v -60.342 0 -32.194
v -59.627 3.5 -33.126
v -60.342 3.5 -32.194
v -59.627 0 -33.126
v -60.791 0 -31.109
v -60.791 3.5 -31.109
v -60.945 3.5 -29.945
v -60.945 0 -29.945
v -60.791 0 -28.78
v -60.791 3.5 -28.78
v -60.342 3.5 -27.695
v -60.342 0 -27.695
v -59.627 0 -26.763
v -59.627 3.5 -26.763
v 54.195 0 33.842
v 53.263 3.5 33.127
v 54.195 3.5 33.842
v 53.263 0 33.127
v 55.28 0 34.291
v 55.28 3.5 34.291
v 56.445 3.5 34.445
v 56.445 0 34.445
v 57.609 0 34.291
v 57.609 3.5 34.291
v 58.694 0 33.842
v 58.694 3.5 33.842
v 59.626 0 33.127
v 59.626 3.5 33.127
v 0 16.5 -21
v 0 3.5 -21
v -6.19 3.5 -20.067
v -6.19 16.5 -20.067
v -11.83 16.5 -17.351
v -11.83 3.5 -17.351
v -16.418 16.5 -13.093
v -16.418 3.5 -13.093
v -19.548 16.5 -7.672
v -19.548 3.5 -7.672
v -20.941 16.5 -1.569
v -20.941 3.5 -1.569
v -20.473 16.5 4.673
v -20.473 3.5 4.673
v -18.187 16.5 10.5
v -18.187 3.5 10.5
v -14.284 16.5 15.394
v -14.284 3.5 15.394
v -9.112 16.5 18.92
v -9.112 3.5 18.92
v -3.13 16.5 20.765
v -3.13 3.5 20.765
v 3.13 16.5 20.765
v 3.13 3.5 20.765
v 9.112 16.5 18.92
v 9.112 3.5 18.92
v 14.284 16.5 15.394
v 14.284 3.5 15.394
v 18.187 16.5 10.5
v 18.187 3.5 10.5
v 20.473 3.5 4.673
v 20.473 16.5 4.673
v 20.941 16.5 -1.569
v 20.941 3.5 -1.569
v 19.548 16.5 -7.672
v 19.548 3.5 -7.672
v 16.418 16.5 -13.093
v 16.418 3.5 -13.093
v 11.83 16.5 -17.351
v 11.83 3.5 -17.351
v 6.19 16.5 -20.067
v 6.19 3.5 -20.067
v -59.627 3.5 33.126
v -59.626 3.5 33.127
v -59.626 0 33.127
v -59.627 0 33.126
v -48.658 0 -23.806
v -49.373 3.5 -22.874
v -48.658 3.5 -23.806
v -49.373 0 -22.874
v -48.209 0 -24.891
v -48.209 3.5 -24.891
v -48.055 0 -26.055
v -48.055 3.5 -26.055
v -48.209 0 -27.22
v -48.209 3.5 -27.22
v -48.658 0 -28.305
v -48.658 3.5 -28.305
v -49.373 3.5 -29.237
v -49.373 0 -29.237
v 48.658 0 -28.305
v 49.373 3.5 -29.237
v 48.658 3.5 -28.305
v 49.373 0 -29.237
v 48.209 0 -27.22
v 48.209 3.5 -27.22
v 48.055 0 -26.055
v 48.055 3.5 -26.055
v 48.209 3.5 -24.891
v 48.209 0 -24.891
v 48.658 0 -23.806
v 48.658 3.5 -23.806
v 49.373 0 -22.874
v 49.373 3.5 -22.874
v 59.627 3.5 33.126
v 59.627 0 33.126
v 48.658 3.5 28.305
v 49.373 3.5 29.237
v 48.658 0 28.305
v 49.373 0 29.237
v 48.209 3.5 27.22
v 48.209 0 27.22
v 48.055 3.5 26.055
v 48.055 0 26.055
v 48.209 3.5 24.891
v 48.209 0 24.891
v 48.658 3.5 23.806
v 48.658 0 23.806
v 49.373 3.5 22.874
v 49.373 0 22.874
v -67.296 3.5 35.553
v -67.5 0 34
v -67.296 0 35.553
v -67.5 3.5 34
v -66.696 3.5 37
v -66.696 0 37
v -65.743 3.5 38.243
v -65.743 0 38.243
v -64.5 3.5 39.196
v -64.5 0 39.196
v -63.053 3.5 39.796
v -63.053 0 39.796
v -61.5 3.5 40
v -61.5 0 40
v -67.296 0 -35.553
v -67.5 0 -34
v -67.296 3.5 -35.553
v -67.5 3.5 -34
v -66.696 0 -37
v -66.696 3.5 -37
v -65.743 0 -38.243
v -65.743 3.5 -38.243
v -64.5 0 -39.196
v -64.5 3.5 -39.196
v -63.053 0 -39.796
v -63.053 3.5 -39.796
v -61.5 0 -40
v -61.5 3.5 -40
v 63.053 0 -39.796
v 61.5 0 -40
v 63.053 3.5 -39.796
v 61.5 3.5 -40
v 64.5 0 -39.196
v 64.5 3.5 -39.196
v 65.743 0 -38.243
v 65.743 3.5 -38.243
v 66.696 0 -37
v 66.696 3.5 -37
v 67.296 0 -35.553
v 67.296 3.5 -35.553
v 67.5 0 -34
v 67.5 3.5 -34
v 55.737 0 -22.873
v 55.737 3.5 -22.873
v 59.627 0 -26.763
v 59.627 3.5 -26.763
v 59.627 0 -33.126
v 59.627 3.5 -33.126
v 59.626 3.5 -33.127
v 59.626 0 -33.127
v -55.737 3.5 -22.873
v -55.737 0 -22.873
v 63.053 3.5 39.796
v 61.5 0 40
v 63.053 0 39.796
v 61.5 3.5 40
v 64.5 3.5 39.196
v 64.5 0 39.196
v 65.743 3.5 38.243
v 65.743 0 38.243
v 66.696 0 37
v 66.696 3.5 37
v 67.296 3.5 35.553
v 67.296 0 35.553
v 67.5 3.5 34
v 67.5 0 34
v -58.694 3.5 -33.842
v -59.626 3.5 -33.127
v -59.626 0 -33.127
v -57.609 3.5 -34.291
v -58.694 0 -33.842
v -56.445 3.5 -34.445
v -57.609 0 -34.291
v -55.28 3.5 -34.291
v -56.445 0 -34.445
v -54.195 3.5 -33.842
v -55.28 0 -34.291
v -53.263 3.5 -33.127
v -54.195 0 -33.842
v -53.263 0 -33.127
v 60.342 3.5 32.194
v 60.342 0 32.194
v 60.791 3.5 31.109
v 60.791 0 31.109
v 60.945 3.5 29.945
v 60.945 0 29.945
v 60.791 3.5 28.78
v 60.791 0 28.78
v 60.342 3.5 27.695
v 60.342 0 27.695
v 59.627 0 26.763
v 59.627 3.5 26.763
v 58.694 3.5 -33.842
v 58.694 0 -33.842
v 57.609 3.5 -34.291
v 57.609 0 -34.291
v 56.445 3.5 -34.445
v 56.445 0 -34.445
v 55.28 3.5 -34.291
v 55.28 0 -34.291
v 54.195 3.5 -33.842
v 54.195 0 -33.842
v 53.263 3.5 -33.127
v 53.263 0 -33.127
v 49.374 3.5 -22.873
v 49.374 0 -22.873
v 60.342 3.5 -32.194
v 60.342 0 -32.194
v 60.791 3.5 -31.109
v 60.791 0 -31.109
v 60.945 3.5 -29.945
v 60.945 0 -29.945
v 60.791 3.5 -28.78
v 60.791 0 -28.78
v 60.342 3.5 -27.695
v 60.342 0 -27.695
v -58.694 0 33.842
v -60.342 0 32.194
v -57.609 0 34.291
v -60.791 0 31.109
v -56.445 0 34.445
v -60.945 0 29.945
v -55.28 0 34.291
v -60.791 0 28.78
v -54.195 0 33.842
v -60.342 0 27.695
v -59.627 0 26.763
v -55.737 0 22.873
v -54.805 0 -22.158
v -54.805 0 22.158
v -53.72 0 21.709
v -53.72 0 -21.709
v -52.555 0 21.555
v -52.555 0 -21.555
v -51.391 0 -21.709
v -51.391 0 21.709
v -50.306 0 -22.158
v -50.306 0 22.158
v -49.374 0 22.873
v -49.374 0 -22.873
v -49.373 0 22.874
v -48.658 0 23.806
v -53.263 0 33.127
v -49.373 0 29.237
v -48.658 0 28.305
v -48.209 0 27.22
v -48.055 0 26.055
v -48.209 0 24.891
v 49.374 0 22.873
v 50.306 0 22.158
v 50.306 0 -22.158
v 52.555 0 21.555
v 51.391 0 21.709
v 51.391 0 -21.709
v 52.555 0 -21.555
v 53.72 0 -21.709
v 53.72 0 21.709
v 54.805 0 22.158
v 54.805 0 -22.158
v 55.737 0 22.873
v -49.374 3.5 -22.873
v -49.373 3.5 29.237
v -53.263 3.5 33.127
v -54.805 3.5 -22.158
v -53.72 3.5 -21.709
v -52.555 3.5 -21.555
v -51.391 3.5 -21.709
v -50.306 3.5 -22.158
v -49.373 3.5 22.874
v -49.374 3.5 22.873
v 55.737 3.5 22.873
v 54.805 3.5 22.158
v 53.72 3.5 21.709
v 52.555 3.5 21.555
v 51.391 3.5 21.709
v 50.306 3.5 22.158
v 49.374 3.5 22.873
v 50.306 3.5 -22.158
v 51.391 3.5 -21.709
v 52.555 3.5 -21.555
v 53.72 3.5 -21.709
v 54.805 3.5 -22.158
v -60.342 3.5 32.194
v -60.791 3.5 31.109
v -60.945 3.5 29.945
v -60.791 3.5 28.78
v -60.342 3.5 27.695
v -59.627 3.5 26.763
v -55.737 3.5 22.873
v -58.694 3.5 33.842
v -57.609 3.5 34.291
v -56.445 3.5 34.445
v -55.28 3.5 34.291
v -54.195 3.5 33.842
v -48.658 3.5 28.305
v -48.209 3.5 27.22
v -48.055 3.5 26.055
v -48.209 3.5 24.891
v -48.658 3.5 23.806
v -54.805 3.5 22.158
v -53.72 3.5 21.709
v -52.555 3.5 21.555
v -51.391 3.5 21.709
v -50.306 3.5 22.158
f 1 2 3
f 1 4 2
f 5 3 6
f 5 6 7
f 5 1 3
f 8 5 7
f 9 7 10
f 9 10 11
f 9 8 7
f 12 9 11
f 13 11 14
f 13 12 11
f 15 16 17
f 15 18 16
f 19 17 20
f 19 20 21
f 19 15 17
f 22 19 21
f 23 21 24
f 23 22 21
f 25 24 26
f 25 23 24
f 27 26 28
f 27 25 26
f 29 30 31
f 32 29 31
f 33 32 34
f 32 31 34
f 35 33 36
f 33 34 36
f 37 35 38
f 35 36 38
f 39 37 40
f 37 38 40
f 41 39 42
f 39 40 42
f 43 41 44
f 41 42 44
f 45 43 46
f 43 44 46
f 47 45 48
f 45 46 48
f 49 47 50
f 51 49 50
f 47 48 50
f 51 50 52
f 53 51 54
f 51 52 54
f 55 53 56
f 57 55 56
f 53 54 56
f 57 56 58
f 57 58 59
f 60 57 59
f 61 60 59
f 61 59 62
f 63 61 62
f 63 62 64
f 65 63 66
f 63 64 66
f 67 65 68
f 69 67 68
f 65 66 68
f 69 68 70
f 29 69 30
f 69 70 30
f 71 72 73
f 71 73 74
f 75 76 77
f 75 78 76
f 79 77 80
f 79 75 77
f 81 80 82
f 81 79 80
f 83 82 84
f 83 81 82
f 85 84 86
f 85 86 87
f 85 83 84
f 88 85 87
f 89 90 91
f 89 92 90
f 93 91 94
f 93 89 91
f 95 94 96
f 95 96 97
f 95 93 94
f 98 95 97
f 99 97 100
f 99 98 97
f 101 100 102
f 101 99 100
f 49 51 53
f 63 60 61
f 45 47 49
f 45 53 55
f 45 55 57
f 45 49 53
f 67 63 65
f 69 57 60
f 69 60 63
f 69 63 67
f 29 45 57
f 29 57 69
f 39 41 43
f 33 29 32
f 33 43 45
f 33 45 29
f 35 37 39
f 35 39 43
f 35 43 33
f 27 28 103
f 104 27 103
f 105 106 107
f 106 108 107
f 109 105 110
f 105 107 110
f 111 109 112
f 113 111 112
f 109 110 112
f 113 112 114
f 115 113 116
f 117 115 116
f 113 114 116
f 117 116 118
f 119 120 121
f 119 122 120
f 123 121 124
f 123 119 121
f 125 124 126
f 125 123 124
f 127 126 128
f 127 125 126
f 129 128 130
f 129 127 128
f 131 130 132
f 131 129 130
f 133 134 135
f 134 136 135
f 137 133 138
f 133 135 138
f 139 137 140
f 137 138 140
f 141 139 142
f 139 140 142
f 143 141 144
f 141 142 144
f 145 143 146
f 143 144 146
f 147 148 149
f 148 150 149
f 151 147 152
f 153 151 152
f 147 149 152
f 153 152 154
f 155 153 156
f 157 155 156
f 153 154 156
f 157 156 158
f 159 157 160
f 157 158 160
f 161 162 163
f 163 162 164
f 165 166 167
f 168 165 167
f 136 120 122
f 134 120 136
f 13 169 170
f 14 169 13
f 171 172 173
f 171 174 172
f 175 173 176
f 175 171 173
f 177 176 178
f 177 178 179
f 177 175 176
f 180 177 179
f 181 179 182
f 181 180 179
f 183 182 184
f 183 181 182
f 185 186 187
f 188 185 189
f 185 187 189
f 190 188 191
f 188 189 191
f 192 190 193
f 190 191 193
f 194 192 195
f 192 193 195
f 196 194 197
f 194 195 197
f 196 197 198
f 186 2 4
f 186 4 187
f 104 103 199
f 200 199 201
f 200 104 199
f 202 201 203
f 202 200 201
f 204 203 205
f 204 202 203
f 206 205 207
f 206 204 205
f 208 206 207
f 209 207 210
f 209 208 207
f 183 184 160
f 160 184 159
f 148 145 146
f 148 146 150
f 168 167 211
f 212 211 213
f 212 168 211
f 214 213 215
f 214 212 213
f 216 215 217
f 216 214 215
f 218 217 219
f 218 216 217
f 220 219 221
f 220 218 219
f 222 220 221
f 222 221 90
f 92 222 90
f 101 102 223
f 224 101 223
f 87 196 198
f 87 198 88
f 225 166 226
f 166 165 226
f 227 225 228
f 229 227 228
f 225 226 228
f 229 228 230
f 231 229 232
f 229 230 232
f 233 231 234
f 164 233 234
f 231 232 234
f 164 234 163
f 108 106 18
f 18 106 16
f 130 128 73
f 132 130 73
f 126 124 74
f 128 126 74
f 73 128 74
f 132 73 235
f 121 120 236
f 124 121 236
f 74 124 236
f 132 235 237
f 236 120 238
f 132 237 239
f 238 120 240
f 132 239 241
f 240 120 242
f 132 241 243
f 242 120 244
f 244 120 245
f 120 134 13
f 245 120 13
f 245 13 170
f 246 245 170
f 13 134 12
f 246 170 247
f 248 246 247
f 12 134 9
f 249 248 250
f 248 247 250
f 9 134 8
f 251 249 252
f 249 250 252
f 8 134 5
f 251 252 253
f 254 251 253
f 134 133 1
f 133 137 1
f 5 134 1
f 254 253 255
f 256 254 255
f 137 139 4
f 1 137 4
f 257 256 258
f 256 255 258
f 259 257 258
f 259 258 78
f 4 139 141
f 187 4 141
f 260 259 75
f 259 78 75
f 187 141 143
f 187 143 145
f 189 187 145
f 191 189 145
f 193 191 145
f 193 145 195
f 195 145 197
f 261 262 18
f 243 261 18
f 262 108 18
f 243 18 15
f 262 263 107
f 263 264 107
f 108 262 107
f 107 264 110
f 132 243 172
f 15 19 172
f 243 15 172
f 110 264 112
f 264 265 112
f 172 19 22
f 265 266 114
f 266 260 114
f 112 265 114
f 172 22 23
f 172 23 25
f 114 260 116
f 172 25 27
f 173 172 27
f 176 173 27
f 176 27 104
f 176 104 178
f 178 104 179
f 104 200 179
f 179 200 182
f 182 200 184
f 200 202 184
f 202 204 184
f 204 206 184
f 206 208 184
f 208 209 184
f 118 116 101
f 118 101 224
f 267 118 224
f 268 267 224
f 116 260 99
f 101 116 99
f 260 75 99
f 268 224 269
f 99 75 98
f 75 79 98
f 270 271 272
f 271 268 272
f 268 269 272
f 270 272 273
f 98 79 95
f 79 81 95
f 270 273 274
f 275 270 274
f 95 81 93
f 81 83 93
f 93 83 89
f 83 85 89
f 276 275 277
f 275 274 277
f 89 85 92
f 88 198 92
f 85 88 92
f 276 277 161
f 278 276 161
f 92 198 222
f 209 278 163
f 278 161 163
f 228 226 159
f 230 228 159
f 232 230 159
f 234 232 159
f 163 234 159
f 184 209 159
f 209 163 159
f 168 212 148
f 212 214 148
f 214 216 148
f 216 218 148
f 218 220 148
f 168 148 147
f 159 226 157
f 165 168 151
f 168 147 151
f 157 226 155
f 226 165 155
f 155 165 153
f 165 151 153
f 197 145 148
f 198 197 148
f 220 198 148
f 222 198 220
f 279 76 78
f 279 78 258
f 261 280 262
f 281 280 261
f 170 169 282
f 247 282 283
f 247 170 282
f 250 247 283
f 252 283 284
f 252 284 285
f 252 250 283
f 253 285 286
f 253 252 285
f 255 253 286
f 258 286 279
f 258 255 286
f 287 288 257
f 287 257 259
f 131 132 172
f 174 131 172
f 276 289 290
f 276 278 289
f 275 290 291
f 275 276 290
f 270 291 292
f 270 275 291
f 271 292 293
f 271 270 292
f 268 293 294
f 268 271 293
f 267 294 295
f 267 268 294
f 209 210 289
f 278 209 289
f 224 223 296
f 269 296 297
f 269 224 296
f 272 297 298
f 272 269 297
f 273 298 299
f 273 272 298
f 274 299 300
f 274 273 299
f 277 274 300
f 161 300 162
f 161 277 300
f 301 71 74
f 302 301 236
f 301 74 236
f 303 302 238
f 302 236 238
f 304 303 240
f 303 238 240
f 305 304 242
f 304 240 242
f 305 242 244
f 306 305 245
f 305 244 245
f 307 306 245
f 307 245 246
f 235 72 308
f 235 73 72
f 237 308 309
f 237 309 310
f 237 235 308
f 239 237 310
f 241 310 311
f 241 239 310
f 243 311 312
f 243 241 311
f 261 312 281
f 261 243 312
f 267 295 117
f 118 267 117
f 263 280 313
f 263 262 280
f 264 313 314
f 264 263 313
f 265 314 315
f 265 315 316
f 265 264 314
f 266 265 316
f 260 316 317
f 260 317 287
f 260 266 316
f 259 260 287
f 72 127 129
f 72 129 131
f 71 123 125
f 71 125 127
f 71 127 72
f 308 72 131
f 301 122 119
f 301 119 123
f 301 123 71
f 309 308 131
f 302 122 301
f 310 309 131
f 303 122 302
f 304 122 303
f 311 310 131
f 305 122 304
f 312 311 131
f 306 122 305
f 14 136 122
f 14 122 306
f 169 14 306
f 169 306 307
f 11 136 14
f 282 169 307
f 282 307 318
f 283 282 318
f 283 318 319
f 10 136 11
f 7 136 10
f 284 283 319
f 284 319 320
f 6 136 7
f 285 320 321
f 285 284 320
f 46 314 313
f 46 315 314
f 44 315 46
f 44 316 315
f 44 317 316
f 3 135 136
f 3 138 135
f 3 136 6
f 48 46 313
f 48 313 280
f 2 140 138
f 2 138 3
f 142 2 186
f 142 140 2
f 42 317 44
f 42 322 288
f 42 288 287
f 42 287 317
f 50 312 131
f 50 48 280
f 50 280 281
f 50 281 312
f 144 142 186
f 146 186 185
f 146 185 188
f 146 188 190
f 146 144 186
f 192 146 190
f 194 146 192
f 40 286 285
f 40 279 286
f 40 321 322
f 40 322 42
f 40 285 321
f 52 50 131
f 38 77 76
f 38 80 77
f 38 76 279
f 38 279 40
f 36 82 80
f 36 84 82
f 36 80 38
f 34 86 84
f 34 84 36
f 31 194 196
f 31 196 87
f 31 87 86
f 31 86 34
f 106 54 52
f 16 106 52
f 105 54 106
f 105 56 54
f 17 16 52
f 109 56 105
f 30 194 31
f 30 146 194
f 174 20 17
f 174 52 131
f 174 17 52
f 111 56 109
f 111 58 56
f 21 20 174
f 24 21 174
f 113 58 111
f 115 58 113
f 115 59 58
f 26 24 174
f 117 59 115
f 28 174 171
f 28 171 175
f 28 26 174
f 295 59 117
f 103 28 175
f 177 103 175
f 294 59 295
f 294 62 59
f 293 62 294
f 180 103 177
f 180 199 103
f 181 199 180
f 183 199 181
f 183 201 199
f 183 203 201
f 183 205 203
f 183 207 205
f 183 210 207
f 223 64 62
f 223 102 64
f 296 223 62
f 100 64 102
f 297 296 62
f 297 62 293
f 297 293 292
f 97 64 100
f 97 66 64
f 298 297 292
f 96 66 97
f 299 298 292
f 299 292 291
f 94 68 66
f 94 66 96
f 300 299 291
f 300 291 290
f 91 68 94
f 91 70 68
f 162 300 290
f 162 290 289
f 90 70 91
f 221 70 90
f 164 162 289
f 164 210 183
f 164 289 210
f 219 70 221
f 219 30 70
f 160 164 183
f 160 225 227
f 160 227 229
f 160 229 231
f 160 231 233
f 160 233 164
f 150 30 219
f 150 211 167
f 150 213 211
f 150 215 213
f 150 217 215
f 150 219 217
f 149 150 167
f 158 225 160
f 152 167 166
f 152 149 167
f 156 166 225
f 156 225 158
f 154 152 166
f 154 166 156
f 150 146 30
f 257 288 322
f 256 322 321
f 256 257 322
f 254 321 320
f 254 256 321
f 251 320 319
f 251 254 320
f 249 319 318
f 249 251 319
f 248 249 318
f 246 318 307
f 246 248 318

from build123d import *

# Parameters (mm, degrees)
SKETCH1_W           = 135
SKETCH1_H           = 80
BOSS_EXTRUDE1_DEPTH = 3.5
SKETCH2_R           = 21
BOSS_EXTRUDE2_DEPTH = 13
CUT_EXTRUDE1_DEPTH  = 80.531440324
FILLET1_R           = 6
FILLET2_R           = 4.5


with BuildPart() as part:
    # Sketch1 → Boss-Extrude1 (new body)
    with BuildSketch(Plane(origin=(0, 0, 0), x_dir=(1, 0, 0), z_dir=(0, 1, 0))):
        Rectangle(SKETCH1_W, SKETCH1_H)
    extrude(amount=BOSS_EXTRUDE1_DEPTH)

    # Sketch2 → Boss-Extrude2 (add)
    with BuildSketch(Plane(origin=(0, 3.5, 0), x_dir=(1, 0, 0), z_dir=(0, 1, 0))):
        with Locations(Location((0, 0, 0), (0, 0, 90))):
            Circle(SKETCH2_R)
    extrude(amount=BOSS_EXTRUDE2_DEPTH)

    # Sketch4 → Cut-Extrude1 (cut, through all)
    with BuildSketch(Plane(origin=(0, 3.5, 0), x_dir=(1, 0, 0), z_dir=(0, 1, 0))):
        Polygon((46.191495321, -26.055456352), (56.444543648, -36.308504679), (62.808504679, -29.944543648), (52.555456352, -19.691495321), align=None)
        Polygon((-56.444543648, 36.308504679), (-46.191495321, 26.055456352), (-52.555456352, 19.691495321), (-62.808504679, 29.944543648), align=None)
        Polygon((62.808504679, 29.944543648), (56.444543648, 36.308504679), (46.191495321, 26.055456352), (52.555456352, 19.691495321), align=None)
        Polygon((-62.808504679, -29.944543648), (-52.555456352, -19.691495321), (-46.191495321, -26.055456352), (-56.444543648, -36.308504679), align=None)
    extrude(amount=-CUT_EXTRUDE1_DEPTH, mode=Mode.SUBTRACT)

    # Fillet1
    fillet1_edges = [part.edges().sort_by_distance(p)[0] for p in [
        (67.5, 1.75, 40),
        (-67.5, 1.75, 40),
        (-67.5, 1.75, -40),
        (67.5, 1.75, -40),
    ]]
    fillet(fillet1_edges, radius=FILLET1_R)

    # Fillet2
    fillet2_edges = [part.edges().sort_by_distance(p)[0] for p in [
        (56.444543648, 1.75, -36.308504679),
        (52.555456352, 1.75, 19.691495321),
        (46.191495321, 1.75, -26.055456352),
        (46.191495321, 1.75, 26.055456352),
        (52.555456352, 1.75, -19.691495321),
        (56.444543648, 1.75, 36.308504679),
        (62.808504679, 1.75, -29.944543648),
        (62.808504679, 1.75, 29.944543648),
        (-52.555456352, 1.75, 19.691495321),
        (-46.191495321, 1.75, 26.055456352),
        (-46.191495321, 1.75, -26.055456352),
        (-52.555456352, 1.75, -19.691495321),
        (-56.444543648, 1.75, 36.308504679),
        (-62.808504679, 1.75, 29.944543648),
        (-62.808504679, 1.75, -29.944543648),
        (-56.444543648, 1.75, -36.308504679),
    ]]
    fillet(fillet2_edges, radius=FILLET2_R - 0.0001)  # a hair under: the kernel refuses the full size


solid = part.part
